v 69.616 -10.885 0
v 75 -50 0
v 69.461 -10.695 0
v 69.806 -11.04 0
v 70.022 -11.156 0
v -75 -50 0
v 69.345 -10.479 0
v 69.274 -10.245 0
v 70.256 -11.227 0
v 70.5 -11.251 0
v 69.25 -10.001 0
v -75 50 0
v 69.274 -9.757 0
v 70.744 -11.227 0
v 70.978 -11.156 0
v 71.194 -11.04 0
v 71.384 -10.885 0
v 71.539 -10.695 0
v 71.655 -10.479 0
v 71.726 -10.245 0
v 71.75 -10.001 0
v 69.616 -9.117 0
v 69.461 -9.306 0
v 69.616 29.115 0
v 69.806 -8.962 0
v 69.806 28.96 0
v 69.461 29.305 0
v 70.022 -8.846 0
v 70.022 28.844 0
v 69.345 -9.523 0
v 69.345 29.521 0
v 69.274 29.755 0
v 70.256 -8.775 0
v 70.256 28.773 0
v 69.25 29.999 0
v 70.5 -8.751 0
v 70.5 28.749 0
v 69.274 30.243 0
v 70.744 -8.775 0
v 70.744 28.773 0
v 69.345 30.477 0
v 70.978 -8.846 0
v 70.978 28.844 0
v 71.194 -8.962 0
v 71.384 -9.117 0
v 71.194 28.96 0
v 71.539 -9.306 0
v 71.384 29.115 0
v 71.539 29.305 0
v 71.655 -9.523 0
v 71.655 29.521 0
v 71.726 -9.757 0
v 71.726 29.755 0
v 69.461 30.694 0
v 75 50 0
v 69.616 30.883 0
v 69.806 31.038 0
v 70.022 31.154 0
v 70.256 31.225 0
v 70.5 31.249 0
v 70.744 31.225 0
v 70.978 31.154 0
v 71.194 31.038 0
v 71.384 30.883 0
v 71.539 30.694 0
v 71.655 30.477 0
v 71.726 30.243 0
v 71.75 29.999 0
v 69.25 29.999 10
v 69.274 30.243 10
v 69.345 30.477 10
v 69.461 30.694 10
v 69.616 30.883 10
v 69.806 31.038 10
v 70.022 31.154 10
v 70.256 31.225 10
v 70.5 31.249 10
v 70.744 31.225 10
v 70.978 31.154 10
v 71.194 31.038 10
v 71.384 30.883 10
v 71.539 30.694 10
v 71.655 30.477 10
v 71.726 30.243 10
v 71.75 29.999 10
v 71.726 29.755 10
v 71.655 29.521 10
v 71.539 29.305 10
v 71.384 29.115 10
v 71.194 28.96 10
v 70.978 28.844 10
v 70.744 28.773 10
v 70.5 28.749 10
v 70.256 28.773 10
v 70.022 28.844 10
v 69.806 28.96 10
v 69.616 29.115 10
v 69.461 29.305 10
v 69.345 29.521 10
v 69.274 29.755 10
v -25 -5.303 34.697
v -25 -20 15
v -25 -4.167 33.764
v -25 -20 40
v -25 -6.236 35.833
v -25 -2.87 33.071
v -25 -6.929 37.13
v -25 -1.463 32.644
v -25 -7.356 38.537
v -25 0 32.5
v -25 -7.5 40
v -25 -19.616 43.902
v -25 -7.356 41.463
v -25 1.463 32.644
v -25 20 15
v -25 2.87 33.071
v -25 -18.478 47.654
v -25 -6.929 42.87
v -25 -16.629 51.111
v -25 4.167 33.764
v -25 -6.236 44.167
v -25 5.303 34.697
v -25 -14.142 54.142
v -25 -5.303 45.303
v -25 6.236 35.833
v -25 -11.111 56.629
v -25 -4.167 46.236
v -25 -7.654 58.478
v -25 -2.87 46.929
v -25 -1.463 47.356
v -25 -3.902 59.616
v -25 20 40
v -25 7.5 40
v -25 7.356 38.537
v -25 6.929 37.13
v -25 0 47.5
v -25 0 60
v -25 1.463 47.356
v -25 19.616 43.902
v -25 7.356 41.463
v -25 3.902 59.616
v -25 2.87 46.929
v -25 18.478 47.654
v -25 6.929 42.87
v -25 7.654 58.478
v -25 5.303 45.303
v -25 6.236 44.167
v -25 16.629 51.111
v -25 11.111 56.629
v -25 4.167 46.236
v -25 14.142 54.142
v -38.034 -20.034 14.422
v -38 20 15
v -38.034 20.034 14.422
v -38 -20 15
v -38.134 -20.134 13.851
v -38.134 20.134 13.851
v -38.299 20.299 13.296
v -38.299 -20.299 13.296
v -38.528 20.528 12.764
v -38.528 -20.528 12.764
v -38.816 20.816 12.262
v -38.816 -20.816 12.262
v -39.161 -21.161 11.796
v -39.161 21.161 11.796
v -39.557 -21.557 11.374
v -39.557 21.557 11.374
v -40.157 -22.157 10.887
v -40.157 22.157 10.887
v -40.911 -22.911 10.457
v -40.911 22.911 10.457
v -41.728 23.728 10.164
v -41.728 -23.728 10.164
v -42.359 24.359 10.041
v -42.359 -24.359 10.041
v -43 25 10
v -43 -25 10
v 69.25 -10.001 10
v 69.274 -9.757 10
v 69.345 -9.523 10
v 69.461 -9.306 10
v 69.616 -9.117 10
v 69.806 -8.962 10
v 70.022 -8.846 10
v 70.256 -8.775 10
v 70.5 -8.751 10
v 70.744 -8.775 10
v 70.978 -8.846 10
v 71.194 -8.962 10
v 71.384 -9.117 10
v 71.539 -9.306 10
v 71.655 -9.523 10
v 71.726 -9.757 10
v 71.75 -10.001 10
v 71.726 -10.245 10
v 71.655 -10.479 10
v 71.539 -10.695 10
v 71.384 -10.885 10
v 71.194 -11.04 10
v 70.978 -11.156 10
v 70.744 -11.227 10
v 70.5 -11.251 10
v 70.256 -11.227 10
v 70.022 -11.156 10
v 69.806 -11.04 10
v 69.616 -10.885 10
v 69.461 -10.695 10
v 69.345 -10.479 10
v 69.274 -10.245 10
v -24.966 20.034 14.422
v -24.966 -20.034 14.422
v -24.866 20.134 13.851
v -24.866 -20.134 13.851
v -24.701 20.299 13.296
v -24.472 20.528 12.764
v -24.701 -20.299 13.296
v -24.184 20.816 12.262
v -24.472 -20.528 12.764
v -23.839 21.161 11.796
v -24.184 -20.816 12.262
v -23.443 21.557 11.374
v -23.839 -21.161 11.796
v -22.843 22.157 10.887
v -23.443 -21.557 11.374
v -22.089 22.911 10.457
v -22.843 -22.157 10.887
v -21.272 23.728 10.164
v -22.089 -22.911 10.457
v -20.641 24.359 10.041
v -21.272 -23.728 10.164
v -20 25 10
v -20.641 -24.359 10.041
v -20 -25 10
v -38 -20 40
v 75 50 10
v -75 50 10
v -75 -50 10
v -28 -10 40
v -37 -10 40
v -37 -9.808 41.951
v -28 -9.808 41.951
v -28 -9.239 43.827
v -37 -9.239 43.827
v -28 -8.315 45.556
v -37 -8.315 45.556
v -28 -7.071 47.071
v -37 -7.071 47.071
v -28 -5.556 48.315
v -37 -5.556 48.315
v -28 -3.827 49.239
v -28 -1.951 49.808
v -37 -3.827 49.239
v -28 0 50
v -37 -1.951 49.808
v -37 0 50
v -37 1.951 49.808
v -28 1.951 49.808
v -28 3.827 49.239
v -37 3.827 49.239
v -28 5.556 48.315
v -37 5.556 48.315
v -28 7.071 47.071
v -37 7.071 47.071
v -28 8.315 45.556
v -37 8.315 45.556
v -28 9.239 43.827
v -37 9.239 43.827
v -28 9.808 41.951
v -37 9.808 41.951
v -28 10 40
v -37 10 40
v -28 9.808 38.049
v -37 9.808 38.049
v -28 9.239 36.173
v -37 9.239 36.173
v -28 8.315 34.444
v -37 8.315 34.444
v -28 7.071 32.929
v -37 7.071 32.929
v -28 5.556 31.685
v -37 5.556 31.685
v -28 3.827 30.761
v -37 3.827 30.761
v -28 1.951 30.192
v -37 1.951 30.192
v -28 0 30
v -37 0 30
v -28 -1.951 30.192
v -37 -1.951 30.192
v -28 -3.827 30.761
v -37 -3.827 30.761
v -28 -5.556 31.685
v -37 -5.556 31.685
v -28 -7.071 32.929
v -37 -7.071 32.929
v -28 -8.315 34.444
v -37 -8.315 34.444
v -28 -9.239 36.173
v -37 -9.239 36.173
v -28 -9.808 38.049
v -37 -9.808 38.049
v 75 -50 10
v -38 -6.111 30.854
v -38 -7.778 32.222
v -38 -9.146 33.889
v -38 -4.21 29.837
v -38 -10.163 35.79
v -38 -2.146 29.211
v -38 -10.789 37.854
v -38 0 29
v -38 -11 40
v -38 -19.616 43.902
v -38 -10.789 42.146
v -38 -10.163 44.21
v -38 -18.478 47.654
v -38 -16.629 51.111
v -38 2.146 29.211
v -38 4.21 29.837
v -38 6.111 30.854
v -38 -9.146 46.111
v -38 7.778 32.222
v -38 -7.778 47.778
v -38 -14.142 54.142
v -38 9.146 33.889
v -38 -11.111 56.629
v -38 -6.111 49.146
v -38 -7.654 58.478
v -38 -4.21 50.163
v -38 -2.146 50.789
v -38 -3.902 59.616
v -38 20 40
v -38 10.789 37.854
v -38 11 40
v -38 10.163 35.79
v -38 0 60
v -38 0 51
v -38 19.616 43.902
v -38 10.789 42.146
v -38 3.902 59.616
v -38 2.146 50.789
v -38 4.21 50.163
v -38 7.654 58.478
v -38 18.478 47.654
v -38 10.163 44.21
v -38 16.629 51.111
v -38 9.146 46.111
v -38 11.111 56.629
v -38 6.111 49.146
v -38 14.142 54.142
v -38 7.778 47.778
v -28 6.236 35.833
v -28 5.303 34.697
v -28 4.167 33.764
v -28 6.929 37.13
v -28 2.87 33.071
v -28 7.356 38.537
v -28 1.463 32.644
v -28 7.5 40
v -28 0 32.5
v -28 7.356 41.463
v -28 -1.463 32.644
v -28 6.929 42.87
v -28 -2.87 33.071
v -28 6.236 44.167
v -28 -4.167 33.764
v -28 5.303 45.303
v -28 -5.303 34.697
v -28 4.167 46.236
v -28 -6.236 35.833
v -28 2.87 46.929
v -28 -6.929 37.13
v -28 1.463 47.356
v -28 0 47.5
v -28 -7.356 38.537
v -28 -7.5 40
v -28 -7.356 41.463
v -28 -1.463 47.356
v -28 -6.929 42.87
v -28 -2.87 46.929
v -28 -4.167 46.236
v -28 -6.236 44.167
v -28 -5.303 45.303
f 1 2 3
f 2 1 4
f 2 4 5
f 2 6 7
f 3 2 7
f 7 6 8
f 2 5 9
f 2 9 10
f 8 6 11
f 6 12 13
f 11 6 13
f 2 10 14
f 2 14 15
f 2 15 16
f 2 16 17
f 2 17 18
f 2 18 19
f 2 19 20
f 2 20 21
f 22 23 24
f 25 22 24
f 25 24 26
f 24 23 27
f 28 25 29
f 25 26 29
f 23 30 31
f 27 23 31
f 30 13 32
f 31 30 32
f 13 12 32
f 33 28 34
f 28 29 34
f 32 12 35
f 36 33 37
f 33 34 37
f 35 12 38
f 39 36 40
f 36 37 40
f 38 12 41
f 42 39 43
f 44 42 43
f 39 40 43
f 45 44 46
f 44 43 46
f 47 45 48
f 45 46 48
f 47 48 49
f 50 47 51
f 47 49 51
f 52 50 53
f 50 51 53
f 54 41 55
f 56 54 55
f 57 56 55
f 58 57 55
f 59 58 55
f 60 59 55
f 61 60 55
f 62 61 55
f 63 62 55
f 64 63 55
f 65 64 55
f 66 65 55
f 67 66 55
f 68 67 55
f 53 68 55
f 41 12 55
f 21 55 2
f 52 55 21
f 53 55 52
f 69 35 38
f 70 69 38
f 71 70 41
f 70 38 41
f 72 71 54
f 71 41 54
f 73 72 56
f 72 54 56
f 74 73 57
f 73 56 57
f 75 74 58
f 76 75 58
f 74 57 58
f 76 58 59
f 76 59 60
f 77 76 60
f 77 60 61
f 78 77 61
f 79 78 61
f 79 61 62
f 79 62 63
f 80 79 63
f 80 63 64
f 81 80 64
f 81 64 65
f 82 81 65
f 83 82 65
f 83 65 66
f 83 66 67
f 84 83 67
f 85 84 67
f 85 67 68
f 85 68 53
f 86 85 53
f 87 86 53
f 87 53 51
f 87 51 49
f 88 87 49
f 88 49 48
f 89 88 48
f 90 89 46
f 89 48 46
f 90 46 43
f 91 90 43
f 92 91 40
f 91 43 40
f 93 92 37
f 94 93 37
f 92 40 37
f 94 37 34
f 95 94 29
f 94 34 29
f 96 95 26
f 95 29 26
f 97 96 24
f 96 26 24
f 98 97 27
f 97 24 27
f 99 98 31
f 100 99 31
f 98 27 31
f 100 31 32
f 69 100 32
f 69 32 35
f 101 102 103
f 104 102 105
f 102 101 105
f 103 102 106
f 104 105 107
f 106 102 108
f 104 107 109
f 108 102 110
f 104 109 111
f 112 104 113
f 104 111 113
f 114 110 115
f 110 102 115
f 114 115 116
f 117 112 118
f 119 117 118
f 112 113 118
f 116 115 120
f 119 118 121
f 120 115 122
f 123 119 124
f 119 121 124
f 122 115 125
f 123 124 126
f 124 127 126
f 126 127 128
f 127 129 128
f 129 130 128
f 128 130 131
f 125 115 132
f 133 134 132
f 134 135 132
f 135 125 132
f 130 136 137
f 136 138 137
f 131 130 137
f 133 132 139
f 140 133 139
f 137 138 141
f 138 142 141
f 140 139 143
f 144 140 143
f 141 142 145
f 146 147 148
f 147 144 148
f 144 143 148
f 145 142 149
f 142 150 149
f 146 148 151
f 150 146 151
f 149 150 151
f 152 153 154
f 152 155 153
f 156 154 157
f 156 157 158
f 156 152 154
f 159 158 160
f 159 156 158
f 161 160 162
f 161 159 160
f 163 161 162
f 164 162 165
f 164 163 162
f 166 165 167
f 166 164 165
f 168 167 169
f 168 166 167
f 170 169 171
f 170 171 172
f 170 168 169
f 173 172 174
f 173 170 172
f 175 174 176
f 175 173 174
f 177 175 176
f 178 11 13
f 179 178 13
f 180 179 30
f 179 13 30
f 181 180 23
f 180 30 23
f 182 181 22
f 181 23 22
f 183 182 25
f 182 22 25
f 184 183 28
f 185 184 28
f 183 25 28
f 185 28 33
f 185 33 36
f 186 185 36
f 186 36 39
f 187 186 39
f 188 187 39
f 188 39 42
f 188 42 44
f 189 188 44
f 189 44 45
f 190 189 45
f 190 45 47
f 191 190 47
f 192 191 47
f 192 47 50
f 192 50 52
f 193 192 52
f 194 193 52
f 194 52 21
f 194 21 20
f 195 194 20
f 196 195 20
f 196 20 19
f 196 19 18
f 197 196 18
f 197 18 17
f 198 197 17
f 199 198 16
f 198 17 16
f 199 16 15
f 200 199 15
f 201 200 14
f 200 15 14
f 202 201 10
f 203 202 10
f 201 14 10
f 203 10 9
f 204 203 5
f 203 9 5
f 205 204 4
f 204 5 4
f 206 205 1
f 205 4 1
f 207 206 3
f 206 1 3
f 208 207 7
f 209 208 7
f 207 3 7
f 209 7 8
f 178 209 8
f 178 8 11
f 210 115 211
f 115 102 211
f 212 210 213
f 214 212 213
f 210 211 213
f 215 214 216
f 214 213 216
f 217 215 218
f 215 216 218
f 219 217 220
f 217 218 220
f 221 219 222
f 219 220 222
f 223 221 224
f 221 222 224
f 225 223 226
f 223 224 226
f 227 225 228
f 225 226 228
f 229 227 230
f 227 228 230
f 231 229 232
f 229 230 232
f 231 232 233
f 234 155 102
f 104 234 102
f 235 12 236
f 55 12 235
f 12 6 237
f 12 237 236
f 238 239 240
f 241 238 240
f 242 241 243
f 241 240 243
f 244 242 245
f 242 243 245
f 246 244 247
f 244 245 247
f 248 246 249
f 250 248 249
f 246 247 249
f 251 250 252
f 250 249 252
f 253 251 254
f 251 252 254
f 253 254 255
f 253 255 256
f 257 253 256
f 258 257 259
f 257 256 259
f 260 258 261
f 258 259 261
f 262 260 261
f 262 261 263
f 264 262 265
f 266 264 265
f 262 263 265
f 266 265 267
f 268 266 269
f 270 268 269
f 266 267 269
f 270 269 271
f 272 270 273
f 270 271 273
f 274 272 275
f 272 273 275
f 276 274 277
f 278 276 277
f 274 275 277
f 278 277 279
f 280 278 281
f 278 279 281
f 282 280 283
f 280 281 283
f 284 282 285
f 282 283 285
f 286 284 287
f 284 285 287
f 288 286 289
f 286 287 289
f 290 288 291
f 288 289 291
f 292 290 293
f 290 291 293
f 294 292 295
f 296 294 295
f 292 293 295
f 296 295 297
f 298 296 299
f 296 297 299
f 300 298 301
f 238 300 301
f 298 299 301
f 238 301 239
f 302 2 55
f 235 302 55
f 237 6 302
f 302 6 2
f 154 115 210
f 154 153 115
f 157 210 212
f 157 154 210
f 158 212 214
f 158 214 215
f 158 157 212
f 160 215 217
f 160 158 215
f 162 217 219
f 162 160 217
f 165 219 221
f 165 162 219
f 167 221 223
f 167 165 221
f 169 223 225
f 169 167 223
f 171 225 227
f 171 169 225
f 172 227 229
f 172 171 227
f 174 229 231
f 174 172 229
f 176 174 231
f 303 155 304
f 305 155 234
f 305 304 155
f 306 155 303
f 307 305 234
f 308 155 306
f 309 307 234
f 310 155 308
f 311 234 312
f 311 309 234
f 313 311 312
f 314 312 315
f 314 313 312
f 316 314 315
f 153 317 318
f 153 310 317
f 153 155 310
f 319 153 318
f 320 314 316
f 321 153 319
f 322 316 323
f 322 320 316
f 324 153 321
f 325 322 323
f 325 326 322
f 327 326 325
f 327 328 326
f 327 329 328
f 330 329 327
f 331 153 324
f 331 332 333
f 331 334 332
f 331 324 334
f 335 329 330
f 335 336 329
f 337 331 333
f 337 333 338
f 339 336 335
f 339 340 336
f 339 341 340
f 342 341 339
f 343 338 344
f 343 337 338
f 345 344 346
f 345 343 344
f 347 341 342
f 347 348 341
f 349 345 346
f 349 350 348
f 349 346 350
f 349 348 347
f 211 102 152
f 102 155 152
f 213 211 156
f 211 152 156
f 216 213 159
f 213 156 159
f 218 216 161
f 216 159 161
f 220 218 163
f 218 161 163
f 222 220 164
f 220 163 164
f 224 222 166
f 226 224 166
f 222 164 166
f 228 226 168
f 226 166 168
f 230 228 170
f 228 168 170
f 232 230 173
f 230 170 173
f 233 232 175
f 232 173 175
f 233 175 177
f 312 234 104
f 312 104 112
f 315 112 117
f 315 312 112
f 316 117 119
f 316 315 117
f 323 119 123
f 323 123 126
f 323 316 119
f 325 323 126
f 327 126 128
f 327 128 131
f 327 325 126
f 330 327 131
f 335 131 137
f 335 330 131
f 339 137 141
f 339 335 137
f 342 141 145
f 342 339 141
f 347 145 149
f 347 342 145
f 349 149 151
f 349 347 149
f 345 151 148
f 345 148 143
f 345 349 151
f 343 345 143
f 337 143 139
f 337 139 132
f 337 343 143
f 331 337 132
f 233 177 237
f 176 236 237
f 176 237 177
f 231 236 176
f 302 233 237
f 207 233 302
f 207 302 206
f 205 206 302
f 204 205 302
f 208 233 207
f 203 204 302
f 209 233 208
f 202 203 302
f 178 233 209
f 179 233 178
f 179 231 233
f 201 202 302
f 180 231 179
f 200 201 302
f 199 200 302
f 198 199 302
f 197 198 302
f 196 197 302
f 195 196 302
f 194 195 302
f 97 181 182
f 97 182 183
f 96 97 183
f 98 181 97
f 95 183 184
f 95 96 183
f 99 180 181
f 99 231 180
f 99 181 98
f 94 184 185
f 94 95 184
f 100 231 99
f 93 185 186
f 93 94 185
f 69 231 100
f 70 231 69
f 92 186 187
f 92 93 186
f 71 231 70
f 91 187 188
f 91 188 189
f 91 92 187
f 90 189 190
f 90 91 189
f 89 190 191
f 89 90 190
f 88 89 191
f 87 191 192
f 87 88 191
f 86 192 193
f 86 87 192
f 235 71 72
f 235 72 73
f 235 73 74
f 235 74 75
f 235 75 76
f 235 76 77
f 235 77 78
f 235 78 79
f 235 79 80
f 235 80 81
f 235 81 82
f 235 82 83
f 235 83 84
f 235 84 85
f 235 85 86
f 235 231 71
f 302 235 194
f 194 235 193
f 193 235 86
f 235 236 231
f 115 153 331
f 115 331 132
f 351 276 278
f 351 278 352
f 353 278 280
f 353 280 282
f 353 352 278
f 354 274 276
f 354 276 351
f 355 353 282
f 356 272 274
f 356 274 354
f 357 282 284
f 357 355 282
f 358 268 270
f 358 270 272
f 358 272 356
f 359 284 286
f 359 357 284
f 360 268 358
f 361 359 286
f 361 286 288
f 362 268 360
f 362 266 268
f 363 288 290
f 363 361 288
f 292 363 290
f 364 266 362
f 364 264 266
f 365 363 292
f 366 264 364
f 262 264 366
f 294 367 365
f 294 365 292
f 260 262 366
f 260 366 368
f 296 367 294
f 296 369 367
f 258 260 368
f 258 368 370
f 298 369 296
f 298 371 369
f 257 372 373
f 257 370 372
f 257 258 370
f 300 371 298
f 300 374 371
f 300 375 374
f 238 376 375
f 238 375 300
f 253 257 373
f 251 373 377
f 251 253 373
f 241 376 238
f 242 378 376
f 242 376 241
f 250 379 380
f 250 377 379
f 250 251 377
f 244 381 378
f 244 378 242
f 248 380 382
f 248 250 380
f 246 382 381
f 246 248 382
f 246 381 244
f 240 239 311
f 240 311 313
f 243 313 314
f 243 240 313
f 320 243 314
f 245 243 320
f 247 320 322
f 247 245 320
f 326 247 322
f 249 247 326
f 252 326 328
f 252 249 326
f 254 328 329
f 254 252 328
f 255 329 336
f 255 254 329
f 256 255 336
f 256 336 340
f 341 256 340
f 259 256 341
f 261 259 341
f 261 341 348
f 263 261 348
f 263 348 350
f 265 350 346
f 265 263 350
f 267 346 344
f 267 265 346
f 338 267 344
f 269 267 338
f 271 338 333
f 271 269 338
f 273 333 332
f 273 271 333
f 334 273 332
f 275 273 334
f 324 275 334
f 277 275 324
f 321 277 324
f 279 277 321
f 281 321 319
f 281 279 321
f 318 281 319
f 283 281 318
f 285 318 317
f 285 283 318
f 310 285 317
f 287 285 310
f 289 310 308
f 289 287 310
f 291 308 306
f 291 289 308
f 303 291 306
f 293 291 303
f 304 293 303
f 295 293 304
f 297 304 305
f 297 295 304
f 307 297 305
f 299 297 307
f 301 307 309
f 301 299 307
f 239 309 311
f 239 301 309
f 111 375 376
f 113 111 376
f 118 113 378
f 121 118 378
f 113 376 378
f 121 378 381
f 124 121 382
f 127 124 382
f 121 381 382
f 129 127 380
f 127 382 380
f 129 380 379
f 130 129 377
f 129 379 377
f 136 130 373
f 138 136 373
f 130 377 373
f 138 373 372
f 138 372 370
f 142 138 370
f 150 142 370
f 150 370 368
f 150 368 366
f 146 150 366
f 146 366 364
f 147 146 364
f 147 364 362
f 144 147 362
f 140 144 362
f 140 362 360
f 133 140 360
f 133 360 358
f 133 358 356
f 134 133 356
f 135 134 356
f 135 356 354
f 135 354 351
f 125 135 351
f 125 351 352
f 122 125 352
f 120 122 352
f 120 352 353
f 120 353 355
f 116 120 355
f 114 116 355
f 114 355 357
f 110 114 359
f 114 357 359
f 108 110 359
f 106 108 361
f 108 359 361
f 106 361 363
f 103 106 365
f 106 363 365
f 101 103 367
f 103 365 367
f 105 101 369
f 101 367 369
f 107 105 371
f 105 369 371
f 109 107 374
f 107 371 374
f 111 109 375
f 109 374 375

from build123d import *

# Parameters (mm, degrees)
SKETCH_2_W          = 150
SKETCH_2_H          = 100
EXTRUDE_1_DEPTH     = 10
SKETCH_3_W          = 13
SKETCH_3_H          = 40
EXTRUDE_2_DEPTH     = 40
SKETCH_4_R          = 20
EXTRUDE_3_DEPTH     = 13
SKETCH_5_R          = 10
CUT_EXTRUDE_1_DEPTH = 10
M3X0_5_2_D          = 2.5
FILLET_1_R          = 5
SKETCH_12_R         = 7.5
CUT_EXTRUDE_2_DEPTH = 130.263297188
CHAMFER_1_SIZE      = 1


with BuildPart() as part:
    # ｽｹｯﾁ2 → ﾎﾞｽ - 押し出し1 (new body)
    with BuildSketch(Plane.XY):
        Rectangle(SKETCH_2_W, SKETCH_2_H)
    extrude(amount=EXTRUDE_1_DEPTH)

    # ｽｹｯﾁ3 → ﾎﾞｽ - 押し出し2 (add)
    with BuildSketch(Plane.XY):
        with Locations((-31.5, 0)):
            Rectangle(SKETCH_3_W, SKETCH_3_H)
    extrude(amount=EXTRUDE_2_DEPTH)

    # ｽｹｯﾁ4 → ﾎﾞｽ - 押し出し3 (add)
    with BuildSketch(Plane.ZY.offset(38)):
        with Locations((40, 0)):
            Circle(SKETCH_4_R)
    extrude(amount=-EXTRUDE_3_DEPTH)

    # ｽｹｯﾁ5 → ｶｯﾄ - 押し出し1 (cut)
    with BuildSketch(Plane.ZY.offset(38)):
        with Locations(Location((40, 0, 0), (0, 0, 270))):
            Circle(SKETCH_5_R)
    extrude(amount=-CUT_EXTRUDE_1_DEPTH, mode=Mode.SUBTRACT)

    # M3x0.5 ねじ穴2 (through all)
    with Locations(Plane.XY.offset(10)):
        with Locations((70.5, -10.000898701), (70.5, 29.999101299)):
            Hole(M3X0_5_2_D / 2)

    # ﾌｨﾚｯﾄ1
    fillet_1_edges = [part.edges().sort_by_distance(p)[0] for p in [
        (-31.5, 20, 10),
        (-38, 0, 10),
        (-31.5, -20, 10),
        (-25, 0, 10),
    ]]
    fillet(fillet_1_edges, radius=FILLET_1_R)

    # ｽｹｯﾁ12 → ｶｯﾄ - 押し出し2 (cut, through all)
    with BuildSketch(Plane.ZY.offset(28)):
        with Locations(Location((40, 0, 0), (0, 0, 270))):
            Circle(SKETCH_12_R)
    extrude(amount=-CUT_EXTRUDE_2_DEPTH, mode=Mode.SUBTRACT)

    # 面取り1
    chamfer_1_edges = [part.edges().sort_by_distance(p)[0] for p in [
        (-38, 10, 40),
    ]]
    chamfer(chamfer_1_edges, length=CHAMFER_1_SIZE)


solid = part.part
